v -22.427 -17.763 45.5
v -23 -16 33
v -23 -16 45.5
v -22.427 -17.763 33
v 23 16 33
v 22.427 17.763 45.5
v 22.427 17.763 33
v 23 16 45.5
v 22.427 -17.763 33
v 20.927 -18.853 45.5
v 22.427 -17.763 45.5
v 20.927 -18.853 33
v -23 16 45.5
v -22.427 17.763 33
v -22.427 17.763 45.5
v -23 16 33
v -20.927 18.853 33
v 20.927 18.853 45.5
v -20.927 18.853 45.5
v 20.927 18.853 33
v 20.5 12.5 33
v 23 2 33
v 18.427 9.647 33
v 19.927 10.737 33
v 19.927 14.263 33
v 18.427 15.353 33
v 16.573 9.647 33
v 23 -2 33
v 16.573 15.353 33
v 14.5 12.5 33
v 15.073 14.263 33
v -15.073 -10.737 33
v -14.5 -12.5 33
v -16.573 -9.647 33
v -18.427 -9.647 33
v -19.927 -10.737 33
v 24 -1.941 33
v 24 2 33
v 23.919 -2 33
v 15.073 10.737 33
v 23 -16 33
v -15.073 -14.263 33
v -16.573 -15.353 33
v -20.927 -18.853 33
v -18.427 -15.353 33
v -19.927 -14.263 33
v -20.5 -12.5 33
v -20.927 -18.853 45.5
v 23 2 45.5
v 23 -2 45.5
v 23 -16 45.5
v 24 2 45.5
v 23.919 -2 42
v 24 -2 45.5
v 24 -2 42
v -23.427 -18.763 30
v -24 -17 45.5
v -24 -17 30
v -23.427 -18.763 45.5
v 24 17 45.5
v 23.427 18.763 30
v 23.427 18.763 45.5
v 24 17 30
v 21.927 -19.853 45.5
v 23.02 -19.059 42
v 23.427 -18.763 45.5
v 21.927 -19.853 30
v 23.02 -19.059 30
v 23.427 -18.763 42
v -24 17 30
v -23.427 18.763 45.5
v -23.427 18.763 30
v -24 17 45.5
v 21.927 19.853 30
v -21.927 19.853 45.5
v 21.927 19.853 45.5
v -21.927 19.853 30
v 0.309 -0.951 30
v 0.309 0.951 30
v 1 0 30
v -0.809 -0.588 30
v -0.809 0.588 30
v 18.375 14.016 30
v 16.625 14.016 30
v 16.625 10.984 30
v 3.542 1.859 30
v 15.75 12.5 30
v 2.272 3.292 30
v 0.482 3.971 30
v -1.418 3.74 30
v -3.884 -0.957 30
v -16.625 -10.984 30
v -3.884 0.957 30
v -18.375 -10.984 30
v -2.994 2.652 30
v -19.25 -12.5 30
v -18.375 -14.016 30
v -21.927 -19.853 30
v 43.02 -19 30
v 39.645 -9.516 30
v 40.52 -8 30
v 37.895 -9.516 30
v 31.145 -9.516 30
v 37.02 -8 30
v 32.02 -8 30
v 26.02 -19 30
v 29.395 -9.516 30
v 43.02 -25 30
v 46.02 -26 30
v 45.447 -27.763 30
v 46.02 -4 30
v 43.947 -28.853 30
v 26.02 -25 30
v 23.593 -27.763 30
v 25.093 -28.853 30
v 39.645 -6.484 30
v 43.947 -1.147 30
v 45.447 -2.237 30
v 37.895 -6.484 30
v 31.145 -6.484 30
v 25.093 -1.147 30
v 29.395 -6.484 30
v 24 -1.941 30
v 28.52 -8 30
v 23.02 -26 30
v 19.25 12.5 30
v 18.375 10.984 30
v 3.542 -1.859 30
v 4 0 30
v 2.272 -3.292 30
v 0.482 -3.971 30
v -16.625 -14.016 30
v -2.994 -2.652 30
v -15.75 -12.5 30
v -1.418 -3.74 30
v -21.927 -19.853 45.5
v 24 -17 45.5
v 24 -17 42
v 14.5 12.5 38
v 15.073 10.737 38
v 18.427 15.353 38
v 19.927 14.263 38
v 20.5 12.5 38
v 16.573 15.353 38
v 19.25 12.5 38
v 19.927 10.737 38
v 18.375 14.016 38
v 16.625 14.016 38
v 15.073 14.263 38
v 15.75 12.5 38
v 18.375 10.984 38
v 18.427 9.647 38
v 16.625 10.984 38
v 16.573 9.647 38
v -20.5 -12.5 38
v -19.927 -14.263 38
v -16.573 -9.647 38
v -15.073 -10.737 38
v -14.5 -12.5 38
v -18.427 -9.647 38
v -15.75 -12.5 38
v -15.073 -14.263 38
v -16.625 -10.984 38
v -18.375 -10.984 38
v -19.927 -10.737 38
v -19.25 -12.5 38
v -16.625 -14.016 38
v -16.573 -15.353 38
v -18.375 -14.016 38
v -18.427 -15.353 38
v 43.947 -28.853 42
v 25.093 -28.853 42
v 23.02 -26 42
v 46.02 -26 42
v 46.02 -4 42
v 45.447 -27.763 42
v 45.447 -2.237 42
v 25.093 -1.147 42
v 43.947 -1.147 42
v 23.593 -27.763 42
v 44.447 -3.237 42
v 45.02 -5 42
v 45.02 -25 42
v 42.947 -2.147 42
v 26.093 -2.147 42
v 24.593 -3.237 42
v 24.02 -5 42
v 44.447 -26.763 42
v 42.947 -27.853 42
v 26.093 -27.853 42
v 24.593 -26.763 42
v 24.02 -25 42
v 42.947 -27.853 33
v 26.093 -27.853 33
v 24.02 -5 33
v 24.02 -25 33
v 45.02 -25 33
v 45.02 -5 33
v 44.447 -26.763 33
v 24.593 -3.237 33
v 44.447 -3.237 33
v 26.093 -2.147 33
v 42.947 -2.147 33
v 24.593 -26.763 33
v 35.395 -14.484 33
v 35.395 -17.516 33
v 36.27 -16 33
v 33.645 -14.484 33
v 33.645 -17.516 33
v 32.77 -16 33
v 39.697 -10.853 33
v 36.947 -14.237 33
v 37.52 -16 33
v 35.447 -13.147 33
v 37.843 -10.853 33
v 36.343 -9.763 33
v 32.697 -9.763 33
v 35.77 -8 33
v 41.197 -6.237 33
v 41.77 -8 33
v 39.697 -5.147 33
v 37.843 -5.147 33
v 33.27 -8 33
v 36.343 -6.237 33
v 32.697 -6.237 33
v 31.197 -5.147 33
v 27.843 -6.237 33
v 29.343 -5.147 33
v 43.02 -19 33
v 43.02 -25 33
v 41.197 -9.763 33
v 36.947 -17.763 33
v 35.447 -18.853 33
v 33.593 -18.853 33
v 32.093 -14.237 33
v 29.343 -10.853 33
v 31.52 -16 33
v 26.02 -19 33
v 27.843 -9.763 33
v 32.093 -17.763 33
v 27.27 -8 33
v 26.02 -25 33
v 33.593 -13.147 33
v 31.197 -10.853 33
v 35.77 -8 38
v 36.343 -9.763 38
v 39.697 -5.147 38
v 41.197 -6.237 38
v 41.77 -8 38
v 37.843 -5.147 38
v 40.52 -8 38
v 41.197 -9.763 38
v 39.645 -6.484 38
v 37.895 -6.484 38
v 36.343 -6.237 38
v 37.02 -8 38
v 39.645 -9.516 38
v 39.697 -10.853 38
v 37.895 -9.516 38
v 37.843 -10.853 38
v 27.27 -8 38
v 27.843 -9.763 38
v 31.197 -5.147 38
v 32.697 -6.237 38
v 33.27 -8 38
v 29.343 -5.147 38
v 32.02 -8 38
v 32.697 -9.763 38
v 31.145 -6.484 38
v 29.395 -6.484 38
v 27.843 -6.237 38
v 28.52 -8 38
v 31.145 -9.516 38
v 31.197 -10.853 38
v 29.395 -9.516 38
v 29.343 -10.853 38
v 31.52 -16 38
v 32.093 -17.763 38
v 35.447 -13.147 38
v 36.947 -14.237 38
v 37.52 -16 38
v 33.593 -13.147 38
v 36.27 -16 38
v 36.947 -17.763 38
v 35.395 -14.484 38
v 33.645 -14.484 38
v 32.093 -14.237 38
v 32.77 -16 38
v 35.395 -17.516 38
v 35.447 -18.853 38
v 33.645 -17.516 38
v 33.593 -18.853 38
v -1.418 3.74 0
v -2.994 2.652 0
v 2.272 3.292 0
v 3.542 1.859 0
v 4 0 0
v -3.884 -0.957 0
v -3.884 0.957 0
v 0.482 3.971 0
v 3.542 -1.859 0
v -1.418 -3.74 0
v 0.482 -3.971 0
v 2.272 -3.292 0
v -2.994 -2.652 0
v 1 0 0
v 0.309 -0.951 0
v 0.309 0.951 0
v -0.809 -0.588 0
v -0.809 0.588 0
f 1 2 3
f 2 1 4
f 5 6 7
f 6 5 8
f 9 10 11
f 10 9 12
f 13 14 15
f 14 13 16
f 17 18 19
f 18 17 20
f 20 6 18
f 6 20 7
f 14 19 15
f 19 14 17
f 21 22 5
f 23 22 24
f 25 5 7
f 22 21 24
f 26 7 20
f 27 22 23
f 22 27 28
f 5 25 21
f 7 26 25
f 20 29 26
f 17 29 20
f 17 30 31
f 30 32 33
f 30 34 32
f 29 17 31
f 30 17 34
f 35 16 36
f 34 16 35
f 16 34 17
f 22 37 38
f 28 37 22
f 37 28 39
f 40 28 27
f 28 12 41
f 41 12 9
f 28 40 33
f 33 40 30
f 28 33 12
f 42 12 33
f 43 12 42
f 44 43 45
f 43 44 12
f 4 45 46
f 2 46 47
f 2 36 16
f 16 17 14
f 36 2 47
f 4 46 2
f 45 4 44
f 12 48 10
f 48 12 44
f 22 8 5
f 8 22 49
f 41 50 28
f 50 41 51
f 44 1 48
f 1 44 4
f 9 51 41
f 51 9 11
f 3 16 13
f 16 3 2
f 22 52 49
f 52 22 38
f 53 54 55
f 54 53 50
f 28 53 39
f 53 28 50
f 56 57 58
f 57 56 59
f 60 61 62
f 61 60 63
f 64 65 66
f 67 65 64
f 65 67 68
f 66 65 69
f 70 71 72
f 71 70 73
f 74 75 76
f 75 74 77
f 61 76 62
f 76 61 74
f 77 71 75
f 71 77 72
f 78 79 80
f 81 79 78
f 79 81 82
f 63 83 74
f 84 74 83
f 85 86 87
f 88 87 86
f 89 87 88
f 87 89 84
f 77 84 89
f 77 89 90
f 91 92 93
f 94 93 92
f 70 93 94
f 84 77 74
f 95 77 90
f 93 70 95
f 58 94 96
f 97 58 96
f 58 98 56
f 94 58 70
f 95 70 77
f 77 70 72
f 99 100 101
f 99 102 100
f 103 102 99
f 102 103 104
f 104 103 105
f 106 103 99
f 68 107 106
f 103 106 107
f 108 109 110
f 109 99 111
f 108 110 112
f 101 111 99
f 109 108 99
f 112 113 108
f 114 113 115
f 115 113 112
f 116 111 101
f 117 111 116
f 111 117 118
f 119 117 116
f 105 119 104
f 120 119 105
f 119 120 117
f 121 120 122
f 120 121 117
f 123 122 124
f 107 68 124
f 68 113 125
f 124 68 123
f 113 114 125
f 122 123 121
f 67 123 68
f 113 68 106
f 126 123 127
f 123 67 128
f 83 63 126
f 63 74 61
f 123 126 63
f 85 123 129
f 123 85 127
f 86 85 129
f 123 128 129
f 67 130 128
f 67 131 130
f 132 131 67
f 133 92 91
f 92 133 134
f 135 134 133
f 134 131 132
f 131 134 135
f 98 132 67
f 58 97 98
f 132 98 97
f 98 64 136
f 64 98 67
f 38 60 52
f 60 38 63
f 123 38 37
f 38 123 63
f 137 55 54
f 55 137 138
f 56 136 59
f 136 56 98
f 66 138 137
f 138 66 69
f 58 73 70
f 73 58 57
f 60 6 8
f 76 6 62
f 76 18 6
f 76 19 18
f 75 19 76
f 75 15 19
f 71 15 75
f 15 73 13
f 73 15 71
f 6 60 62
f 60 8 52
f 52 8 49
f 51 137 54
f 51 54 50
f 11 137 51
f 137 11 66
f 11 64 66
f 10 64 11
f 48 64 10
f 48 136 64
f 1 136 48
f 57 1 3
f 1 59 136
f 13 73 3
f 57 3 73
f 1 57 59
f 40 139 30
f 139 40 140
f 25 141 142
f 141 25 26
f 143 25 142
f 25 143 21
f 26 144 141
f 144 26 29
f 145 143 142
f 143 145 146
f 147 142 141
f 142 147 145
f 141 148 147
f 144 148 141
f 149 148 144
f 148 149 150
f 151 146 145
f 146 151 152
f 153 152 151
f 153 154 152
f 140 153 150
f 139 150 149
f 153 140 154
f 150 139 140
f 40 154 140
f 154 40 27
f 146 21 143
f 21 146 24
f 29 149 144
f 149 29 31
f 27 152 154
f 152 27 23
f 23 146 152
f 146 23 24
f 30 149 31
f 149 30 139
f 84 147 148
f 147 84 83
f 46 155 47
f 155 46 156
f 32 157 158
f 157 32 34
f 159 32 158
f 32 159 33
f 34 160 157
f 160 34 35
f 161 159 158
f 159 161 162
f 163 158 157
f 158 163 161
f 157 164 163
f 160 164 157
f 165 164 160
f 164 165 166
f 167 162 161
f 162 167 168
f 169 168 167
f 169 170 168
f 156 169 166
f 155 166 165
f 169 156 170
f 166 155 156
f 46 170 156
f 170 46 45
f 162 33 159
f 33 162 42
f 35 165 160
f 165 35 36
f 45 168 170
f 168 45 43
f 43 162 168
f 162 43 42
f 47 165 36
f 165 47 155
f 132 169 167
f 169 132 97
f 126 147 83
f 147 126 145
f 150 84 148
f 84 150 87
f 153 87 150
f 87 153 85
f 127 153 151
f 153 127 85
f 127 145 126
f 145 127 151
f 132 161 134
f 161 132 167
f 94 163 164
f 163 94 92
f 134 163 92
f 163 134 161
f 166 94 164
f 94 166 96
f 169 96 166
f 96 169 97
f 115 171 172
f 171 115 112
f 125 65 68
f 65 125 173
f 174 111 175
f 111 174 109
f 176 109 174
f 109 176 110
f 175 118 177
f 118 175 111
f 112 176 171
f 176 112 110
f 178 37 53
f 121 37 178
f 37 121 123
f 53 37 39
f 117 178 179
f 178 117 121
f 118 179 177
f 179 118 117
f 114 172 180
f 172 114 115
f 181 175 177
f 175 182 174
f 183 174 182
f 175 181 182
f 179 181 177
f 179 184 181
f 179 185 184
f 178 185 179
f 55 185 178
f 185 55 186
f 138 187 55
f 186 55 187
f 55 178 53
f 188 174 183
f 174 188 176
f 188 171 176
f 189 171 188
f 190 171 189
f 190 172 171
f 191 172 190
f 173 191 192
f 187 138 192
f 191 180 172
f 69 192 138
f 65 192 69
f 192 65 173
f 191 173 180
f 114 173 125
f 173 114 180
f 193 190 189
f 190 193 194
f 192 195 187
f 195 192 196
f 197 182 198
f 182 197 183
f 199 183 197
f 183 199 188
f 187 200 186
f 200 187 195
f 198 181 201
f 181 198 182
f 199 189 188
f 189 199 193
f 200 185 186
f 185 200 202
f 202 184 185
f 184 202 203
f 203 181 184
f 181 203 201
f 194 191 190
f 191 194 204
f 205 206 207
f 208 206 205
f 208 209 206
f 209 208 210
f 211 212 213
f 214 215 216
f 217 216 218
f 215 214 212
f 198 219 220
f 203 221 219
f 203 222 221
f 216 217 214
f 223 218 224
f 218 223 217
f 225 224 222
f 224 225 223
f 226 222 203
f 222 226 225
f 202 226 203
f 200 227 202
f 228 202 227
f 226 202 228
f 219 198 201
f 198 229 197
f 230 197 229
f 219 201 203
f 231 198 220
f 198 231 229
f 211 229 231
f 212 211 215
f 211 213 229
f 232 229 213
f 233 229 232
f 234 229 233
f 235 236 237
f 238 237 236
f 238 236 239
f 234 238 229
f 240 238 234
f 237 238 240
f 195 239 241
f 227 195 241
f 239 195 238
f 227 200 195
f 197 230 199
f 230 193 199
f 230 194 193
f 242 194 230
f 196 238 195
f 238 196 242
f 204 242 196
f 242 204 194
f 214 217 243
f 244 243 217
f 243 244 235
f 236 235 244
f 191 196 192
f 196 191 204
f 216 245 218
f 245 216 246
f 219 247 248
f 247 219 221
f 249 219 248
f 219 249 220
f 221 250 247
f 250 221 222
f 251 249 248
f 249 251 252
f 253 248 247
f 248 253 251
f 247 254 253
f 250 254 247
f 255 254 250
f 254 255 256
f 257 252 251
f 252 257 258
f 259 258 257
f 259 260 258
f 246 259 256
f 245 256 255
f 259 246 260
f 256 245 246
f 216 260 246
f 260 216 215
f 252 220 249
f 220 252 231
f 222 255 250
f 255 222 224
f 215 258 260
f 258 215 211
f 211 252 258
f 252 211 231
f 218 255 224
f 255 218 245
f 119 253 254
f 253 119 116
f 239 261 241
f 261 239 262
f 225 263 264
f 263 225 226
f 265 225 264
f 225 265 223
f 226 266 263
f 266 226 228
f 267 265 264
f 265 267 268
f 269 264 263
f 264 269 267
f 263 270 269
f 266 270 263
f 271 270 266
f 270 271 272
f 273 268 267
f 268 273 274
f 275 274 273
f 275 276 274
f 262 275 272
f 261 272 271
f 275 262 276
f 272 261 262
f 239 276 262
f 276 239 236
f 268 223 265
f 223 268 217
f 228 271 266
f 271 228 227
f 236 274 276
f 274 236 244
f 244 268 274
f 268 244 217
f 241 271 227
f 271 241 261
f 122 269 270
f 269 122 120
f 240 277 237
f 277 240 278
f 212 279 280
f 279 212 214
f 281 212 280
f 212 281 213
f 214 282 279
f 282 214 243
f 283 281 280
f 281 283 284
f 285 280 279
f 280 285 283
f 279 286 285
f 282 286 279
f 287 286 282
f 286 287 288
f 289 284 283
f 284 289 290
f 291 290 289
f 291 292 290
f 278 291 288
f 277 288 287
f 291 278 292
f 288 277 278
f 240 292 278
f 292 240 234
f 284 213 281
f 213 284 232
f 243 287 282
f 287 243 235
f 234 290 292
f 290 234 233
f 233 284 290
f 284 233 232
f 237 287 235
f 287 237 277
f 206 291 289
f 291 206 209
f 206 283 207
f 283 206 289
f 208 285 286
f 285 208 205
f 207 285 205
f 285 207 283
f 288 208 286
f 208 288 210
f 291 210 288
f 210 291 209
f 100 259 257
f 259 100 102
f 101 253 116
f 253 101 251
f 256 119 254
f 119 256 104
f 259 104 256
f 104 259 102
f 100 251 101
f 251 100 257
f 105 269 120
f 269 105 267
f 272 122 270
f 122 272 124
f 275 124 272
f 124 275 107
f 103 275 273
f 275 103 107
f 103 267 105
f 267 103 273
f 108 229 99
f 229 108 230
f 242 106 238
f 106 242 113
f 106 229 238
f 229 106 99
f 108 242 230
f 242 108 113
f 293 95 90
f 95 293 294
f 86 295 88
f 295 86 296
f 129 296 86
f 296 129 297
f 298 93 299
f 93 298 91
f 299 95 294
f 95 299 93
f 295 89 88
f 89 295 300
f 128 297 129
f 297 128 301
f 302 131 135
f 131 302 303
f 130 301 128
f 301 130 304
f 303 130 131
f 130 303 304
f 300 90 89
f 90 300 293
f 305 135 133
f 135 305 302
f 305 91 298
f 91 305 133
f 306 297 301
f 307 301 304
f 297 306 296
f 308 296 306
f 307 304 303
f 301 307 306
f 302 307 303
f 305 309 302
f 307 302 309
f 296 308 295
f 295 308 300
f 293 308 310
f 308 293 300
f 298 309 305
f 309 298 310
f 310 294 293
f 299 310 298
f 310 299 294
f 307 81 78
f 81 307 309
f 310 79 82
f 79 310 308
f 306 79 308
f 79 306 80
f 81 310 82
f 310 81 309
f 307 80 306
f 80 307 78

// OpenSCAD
screwR2 = 1.5+0.5-0.1-0.1-0.05;

TableThickness = 3;

module corner(height) {
 cylinder(r1=3, r2=3, h=height, $n=60);
}


module U_holder() {
 difference() {
   cylinder(r1=6/2, r2=6/2, h=5, $n=60);
   union() {
     cylinder(r1=screwR2 , r2=screwR2, h=10, $n=60);
   }
 }
}

module gps_part() {
  difference() {
    union() {      
      difference() {          
        hull() {
          translate([-42/2, -34/2, 0])
            corner(TableThickness+5+7.5);

          translate([-42/2, +34/2, 0])
            corner(TableThickness+5+7.5);

          translate([+42/2, -34/2, 0])
            corner(TableThickness+5+7.5);

          translate([+42/2, +34/2, 0])
            corner(TableThickness+5+7.5);
        }
        
        // Inner part to subtract
        union() { 
            hull() {
              translate([-42/2+1, -34/2+1, TableThickness])
                corner(TableThickness+5+7.5);

              translate([-42/2+1, +34/2-1, TableThickness])
                corner(TableThickness+5+7.5);

              translate([+42/2-1, -34/2+1, TableThickness])
                corner(TableThickness+5+7.5);

              translate([+42/2-1, +34/2-1, TableThickness])
                corner(TableThickness+5+7.5);                        
            }    
            translate([20, -2, TableThickness])
                cube([10, 4, 5+7.5+2]);
        }
      }
      
      // GPS holding posts
      translate([+35/2, +25/2, TableThickness])
        U_holder();

      translate([-35/2, -25/2, TableThickness])
        U_holder();     

    }
    // Holes for GPS holding posts
    union() {
      translate([+35/2, +25/2, 0])
        cylinder(r1=screwR2 , r2=screwR2, h=20, $n=60);        
      translate([-35/2, -25/2, 0])
        cylinder(r1=screwR2 , r2=screwR2, h=20, $n=60);              
    }
  }  
}


module mag_part() {
  difference() {
    union() {  
      // Magnetometer part
      difference() {
        hull() {
          translate([-17/2, -22/2, 0])
            corner(TableThickness+4+5);

          translate([-17/2, +22/2, 0])
            corner(TableThickness+4+5);

          translate([+17/2, -22/2, 0])
            corner(TableThickness+4+5);

          translate([+17/2, +22/2, 0])
            corner(TableThickness+4+5);
        }
            
        hull() {
          translate([-17/2+1, -22/2+1, TableThickness])
            corner(TableThickness+4+5);

          translate([-17/2+1, +22/2-1, TableThickness])
            corner(TableThickness+4+5);

          translate([+17/2-1, -22/2+1, TableThickness])
            corner(TableThickness+4+5);

          translate([+17/2-1, +22/2-1, TableThickness])
            corner(TableThickness+4+5);
        }       
     }
     // Magnetometer holding posts
     translate([+8.5/2, +7, TableThickness])
      U_holder();

     translate([-8.5/2, +7, TableThickness])
      U_holder();

     translate([0, -1, TableThickness])
      U_holder();
     
 }
  union() {
     translate([+8.5/2, +7, 0])
        cylinder(r1=screwR2 , r2=screwR2, h=20, $n=60);              
     translate([-8.5/2, +7, 0])
        cylinder(r1=screwR2 , r2=screwR2, h=20, $n=60);      
          
     translate([0, -7, 0])
       cube([17, 6, 10], center=true);     

  }
 }
}


translate([0, 0, 30]) {
   gps_part();
   translate([34.52, -15, 0]) 
      mag_part();
}

difference() {
  cylinder(r1=4, r2=4, h=30, $n=60);
  cylinder(r1=1, r2=1, h=30, $n=60);
}
